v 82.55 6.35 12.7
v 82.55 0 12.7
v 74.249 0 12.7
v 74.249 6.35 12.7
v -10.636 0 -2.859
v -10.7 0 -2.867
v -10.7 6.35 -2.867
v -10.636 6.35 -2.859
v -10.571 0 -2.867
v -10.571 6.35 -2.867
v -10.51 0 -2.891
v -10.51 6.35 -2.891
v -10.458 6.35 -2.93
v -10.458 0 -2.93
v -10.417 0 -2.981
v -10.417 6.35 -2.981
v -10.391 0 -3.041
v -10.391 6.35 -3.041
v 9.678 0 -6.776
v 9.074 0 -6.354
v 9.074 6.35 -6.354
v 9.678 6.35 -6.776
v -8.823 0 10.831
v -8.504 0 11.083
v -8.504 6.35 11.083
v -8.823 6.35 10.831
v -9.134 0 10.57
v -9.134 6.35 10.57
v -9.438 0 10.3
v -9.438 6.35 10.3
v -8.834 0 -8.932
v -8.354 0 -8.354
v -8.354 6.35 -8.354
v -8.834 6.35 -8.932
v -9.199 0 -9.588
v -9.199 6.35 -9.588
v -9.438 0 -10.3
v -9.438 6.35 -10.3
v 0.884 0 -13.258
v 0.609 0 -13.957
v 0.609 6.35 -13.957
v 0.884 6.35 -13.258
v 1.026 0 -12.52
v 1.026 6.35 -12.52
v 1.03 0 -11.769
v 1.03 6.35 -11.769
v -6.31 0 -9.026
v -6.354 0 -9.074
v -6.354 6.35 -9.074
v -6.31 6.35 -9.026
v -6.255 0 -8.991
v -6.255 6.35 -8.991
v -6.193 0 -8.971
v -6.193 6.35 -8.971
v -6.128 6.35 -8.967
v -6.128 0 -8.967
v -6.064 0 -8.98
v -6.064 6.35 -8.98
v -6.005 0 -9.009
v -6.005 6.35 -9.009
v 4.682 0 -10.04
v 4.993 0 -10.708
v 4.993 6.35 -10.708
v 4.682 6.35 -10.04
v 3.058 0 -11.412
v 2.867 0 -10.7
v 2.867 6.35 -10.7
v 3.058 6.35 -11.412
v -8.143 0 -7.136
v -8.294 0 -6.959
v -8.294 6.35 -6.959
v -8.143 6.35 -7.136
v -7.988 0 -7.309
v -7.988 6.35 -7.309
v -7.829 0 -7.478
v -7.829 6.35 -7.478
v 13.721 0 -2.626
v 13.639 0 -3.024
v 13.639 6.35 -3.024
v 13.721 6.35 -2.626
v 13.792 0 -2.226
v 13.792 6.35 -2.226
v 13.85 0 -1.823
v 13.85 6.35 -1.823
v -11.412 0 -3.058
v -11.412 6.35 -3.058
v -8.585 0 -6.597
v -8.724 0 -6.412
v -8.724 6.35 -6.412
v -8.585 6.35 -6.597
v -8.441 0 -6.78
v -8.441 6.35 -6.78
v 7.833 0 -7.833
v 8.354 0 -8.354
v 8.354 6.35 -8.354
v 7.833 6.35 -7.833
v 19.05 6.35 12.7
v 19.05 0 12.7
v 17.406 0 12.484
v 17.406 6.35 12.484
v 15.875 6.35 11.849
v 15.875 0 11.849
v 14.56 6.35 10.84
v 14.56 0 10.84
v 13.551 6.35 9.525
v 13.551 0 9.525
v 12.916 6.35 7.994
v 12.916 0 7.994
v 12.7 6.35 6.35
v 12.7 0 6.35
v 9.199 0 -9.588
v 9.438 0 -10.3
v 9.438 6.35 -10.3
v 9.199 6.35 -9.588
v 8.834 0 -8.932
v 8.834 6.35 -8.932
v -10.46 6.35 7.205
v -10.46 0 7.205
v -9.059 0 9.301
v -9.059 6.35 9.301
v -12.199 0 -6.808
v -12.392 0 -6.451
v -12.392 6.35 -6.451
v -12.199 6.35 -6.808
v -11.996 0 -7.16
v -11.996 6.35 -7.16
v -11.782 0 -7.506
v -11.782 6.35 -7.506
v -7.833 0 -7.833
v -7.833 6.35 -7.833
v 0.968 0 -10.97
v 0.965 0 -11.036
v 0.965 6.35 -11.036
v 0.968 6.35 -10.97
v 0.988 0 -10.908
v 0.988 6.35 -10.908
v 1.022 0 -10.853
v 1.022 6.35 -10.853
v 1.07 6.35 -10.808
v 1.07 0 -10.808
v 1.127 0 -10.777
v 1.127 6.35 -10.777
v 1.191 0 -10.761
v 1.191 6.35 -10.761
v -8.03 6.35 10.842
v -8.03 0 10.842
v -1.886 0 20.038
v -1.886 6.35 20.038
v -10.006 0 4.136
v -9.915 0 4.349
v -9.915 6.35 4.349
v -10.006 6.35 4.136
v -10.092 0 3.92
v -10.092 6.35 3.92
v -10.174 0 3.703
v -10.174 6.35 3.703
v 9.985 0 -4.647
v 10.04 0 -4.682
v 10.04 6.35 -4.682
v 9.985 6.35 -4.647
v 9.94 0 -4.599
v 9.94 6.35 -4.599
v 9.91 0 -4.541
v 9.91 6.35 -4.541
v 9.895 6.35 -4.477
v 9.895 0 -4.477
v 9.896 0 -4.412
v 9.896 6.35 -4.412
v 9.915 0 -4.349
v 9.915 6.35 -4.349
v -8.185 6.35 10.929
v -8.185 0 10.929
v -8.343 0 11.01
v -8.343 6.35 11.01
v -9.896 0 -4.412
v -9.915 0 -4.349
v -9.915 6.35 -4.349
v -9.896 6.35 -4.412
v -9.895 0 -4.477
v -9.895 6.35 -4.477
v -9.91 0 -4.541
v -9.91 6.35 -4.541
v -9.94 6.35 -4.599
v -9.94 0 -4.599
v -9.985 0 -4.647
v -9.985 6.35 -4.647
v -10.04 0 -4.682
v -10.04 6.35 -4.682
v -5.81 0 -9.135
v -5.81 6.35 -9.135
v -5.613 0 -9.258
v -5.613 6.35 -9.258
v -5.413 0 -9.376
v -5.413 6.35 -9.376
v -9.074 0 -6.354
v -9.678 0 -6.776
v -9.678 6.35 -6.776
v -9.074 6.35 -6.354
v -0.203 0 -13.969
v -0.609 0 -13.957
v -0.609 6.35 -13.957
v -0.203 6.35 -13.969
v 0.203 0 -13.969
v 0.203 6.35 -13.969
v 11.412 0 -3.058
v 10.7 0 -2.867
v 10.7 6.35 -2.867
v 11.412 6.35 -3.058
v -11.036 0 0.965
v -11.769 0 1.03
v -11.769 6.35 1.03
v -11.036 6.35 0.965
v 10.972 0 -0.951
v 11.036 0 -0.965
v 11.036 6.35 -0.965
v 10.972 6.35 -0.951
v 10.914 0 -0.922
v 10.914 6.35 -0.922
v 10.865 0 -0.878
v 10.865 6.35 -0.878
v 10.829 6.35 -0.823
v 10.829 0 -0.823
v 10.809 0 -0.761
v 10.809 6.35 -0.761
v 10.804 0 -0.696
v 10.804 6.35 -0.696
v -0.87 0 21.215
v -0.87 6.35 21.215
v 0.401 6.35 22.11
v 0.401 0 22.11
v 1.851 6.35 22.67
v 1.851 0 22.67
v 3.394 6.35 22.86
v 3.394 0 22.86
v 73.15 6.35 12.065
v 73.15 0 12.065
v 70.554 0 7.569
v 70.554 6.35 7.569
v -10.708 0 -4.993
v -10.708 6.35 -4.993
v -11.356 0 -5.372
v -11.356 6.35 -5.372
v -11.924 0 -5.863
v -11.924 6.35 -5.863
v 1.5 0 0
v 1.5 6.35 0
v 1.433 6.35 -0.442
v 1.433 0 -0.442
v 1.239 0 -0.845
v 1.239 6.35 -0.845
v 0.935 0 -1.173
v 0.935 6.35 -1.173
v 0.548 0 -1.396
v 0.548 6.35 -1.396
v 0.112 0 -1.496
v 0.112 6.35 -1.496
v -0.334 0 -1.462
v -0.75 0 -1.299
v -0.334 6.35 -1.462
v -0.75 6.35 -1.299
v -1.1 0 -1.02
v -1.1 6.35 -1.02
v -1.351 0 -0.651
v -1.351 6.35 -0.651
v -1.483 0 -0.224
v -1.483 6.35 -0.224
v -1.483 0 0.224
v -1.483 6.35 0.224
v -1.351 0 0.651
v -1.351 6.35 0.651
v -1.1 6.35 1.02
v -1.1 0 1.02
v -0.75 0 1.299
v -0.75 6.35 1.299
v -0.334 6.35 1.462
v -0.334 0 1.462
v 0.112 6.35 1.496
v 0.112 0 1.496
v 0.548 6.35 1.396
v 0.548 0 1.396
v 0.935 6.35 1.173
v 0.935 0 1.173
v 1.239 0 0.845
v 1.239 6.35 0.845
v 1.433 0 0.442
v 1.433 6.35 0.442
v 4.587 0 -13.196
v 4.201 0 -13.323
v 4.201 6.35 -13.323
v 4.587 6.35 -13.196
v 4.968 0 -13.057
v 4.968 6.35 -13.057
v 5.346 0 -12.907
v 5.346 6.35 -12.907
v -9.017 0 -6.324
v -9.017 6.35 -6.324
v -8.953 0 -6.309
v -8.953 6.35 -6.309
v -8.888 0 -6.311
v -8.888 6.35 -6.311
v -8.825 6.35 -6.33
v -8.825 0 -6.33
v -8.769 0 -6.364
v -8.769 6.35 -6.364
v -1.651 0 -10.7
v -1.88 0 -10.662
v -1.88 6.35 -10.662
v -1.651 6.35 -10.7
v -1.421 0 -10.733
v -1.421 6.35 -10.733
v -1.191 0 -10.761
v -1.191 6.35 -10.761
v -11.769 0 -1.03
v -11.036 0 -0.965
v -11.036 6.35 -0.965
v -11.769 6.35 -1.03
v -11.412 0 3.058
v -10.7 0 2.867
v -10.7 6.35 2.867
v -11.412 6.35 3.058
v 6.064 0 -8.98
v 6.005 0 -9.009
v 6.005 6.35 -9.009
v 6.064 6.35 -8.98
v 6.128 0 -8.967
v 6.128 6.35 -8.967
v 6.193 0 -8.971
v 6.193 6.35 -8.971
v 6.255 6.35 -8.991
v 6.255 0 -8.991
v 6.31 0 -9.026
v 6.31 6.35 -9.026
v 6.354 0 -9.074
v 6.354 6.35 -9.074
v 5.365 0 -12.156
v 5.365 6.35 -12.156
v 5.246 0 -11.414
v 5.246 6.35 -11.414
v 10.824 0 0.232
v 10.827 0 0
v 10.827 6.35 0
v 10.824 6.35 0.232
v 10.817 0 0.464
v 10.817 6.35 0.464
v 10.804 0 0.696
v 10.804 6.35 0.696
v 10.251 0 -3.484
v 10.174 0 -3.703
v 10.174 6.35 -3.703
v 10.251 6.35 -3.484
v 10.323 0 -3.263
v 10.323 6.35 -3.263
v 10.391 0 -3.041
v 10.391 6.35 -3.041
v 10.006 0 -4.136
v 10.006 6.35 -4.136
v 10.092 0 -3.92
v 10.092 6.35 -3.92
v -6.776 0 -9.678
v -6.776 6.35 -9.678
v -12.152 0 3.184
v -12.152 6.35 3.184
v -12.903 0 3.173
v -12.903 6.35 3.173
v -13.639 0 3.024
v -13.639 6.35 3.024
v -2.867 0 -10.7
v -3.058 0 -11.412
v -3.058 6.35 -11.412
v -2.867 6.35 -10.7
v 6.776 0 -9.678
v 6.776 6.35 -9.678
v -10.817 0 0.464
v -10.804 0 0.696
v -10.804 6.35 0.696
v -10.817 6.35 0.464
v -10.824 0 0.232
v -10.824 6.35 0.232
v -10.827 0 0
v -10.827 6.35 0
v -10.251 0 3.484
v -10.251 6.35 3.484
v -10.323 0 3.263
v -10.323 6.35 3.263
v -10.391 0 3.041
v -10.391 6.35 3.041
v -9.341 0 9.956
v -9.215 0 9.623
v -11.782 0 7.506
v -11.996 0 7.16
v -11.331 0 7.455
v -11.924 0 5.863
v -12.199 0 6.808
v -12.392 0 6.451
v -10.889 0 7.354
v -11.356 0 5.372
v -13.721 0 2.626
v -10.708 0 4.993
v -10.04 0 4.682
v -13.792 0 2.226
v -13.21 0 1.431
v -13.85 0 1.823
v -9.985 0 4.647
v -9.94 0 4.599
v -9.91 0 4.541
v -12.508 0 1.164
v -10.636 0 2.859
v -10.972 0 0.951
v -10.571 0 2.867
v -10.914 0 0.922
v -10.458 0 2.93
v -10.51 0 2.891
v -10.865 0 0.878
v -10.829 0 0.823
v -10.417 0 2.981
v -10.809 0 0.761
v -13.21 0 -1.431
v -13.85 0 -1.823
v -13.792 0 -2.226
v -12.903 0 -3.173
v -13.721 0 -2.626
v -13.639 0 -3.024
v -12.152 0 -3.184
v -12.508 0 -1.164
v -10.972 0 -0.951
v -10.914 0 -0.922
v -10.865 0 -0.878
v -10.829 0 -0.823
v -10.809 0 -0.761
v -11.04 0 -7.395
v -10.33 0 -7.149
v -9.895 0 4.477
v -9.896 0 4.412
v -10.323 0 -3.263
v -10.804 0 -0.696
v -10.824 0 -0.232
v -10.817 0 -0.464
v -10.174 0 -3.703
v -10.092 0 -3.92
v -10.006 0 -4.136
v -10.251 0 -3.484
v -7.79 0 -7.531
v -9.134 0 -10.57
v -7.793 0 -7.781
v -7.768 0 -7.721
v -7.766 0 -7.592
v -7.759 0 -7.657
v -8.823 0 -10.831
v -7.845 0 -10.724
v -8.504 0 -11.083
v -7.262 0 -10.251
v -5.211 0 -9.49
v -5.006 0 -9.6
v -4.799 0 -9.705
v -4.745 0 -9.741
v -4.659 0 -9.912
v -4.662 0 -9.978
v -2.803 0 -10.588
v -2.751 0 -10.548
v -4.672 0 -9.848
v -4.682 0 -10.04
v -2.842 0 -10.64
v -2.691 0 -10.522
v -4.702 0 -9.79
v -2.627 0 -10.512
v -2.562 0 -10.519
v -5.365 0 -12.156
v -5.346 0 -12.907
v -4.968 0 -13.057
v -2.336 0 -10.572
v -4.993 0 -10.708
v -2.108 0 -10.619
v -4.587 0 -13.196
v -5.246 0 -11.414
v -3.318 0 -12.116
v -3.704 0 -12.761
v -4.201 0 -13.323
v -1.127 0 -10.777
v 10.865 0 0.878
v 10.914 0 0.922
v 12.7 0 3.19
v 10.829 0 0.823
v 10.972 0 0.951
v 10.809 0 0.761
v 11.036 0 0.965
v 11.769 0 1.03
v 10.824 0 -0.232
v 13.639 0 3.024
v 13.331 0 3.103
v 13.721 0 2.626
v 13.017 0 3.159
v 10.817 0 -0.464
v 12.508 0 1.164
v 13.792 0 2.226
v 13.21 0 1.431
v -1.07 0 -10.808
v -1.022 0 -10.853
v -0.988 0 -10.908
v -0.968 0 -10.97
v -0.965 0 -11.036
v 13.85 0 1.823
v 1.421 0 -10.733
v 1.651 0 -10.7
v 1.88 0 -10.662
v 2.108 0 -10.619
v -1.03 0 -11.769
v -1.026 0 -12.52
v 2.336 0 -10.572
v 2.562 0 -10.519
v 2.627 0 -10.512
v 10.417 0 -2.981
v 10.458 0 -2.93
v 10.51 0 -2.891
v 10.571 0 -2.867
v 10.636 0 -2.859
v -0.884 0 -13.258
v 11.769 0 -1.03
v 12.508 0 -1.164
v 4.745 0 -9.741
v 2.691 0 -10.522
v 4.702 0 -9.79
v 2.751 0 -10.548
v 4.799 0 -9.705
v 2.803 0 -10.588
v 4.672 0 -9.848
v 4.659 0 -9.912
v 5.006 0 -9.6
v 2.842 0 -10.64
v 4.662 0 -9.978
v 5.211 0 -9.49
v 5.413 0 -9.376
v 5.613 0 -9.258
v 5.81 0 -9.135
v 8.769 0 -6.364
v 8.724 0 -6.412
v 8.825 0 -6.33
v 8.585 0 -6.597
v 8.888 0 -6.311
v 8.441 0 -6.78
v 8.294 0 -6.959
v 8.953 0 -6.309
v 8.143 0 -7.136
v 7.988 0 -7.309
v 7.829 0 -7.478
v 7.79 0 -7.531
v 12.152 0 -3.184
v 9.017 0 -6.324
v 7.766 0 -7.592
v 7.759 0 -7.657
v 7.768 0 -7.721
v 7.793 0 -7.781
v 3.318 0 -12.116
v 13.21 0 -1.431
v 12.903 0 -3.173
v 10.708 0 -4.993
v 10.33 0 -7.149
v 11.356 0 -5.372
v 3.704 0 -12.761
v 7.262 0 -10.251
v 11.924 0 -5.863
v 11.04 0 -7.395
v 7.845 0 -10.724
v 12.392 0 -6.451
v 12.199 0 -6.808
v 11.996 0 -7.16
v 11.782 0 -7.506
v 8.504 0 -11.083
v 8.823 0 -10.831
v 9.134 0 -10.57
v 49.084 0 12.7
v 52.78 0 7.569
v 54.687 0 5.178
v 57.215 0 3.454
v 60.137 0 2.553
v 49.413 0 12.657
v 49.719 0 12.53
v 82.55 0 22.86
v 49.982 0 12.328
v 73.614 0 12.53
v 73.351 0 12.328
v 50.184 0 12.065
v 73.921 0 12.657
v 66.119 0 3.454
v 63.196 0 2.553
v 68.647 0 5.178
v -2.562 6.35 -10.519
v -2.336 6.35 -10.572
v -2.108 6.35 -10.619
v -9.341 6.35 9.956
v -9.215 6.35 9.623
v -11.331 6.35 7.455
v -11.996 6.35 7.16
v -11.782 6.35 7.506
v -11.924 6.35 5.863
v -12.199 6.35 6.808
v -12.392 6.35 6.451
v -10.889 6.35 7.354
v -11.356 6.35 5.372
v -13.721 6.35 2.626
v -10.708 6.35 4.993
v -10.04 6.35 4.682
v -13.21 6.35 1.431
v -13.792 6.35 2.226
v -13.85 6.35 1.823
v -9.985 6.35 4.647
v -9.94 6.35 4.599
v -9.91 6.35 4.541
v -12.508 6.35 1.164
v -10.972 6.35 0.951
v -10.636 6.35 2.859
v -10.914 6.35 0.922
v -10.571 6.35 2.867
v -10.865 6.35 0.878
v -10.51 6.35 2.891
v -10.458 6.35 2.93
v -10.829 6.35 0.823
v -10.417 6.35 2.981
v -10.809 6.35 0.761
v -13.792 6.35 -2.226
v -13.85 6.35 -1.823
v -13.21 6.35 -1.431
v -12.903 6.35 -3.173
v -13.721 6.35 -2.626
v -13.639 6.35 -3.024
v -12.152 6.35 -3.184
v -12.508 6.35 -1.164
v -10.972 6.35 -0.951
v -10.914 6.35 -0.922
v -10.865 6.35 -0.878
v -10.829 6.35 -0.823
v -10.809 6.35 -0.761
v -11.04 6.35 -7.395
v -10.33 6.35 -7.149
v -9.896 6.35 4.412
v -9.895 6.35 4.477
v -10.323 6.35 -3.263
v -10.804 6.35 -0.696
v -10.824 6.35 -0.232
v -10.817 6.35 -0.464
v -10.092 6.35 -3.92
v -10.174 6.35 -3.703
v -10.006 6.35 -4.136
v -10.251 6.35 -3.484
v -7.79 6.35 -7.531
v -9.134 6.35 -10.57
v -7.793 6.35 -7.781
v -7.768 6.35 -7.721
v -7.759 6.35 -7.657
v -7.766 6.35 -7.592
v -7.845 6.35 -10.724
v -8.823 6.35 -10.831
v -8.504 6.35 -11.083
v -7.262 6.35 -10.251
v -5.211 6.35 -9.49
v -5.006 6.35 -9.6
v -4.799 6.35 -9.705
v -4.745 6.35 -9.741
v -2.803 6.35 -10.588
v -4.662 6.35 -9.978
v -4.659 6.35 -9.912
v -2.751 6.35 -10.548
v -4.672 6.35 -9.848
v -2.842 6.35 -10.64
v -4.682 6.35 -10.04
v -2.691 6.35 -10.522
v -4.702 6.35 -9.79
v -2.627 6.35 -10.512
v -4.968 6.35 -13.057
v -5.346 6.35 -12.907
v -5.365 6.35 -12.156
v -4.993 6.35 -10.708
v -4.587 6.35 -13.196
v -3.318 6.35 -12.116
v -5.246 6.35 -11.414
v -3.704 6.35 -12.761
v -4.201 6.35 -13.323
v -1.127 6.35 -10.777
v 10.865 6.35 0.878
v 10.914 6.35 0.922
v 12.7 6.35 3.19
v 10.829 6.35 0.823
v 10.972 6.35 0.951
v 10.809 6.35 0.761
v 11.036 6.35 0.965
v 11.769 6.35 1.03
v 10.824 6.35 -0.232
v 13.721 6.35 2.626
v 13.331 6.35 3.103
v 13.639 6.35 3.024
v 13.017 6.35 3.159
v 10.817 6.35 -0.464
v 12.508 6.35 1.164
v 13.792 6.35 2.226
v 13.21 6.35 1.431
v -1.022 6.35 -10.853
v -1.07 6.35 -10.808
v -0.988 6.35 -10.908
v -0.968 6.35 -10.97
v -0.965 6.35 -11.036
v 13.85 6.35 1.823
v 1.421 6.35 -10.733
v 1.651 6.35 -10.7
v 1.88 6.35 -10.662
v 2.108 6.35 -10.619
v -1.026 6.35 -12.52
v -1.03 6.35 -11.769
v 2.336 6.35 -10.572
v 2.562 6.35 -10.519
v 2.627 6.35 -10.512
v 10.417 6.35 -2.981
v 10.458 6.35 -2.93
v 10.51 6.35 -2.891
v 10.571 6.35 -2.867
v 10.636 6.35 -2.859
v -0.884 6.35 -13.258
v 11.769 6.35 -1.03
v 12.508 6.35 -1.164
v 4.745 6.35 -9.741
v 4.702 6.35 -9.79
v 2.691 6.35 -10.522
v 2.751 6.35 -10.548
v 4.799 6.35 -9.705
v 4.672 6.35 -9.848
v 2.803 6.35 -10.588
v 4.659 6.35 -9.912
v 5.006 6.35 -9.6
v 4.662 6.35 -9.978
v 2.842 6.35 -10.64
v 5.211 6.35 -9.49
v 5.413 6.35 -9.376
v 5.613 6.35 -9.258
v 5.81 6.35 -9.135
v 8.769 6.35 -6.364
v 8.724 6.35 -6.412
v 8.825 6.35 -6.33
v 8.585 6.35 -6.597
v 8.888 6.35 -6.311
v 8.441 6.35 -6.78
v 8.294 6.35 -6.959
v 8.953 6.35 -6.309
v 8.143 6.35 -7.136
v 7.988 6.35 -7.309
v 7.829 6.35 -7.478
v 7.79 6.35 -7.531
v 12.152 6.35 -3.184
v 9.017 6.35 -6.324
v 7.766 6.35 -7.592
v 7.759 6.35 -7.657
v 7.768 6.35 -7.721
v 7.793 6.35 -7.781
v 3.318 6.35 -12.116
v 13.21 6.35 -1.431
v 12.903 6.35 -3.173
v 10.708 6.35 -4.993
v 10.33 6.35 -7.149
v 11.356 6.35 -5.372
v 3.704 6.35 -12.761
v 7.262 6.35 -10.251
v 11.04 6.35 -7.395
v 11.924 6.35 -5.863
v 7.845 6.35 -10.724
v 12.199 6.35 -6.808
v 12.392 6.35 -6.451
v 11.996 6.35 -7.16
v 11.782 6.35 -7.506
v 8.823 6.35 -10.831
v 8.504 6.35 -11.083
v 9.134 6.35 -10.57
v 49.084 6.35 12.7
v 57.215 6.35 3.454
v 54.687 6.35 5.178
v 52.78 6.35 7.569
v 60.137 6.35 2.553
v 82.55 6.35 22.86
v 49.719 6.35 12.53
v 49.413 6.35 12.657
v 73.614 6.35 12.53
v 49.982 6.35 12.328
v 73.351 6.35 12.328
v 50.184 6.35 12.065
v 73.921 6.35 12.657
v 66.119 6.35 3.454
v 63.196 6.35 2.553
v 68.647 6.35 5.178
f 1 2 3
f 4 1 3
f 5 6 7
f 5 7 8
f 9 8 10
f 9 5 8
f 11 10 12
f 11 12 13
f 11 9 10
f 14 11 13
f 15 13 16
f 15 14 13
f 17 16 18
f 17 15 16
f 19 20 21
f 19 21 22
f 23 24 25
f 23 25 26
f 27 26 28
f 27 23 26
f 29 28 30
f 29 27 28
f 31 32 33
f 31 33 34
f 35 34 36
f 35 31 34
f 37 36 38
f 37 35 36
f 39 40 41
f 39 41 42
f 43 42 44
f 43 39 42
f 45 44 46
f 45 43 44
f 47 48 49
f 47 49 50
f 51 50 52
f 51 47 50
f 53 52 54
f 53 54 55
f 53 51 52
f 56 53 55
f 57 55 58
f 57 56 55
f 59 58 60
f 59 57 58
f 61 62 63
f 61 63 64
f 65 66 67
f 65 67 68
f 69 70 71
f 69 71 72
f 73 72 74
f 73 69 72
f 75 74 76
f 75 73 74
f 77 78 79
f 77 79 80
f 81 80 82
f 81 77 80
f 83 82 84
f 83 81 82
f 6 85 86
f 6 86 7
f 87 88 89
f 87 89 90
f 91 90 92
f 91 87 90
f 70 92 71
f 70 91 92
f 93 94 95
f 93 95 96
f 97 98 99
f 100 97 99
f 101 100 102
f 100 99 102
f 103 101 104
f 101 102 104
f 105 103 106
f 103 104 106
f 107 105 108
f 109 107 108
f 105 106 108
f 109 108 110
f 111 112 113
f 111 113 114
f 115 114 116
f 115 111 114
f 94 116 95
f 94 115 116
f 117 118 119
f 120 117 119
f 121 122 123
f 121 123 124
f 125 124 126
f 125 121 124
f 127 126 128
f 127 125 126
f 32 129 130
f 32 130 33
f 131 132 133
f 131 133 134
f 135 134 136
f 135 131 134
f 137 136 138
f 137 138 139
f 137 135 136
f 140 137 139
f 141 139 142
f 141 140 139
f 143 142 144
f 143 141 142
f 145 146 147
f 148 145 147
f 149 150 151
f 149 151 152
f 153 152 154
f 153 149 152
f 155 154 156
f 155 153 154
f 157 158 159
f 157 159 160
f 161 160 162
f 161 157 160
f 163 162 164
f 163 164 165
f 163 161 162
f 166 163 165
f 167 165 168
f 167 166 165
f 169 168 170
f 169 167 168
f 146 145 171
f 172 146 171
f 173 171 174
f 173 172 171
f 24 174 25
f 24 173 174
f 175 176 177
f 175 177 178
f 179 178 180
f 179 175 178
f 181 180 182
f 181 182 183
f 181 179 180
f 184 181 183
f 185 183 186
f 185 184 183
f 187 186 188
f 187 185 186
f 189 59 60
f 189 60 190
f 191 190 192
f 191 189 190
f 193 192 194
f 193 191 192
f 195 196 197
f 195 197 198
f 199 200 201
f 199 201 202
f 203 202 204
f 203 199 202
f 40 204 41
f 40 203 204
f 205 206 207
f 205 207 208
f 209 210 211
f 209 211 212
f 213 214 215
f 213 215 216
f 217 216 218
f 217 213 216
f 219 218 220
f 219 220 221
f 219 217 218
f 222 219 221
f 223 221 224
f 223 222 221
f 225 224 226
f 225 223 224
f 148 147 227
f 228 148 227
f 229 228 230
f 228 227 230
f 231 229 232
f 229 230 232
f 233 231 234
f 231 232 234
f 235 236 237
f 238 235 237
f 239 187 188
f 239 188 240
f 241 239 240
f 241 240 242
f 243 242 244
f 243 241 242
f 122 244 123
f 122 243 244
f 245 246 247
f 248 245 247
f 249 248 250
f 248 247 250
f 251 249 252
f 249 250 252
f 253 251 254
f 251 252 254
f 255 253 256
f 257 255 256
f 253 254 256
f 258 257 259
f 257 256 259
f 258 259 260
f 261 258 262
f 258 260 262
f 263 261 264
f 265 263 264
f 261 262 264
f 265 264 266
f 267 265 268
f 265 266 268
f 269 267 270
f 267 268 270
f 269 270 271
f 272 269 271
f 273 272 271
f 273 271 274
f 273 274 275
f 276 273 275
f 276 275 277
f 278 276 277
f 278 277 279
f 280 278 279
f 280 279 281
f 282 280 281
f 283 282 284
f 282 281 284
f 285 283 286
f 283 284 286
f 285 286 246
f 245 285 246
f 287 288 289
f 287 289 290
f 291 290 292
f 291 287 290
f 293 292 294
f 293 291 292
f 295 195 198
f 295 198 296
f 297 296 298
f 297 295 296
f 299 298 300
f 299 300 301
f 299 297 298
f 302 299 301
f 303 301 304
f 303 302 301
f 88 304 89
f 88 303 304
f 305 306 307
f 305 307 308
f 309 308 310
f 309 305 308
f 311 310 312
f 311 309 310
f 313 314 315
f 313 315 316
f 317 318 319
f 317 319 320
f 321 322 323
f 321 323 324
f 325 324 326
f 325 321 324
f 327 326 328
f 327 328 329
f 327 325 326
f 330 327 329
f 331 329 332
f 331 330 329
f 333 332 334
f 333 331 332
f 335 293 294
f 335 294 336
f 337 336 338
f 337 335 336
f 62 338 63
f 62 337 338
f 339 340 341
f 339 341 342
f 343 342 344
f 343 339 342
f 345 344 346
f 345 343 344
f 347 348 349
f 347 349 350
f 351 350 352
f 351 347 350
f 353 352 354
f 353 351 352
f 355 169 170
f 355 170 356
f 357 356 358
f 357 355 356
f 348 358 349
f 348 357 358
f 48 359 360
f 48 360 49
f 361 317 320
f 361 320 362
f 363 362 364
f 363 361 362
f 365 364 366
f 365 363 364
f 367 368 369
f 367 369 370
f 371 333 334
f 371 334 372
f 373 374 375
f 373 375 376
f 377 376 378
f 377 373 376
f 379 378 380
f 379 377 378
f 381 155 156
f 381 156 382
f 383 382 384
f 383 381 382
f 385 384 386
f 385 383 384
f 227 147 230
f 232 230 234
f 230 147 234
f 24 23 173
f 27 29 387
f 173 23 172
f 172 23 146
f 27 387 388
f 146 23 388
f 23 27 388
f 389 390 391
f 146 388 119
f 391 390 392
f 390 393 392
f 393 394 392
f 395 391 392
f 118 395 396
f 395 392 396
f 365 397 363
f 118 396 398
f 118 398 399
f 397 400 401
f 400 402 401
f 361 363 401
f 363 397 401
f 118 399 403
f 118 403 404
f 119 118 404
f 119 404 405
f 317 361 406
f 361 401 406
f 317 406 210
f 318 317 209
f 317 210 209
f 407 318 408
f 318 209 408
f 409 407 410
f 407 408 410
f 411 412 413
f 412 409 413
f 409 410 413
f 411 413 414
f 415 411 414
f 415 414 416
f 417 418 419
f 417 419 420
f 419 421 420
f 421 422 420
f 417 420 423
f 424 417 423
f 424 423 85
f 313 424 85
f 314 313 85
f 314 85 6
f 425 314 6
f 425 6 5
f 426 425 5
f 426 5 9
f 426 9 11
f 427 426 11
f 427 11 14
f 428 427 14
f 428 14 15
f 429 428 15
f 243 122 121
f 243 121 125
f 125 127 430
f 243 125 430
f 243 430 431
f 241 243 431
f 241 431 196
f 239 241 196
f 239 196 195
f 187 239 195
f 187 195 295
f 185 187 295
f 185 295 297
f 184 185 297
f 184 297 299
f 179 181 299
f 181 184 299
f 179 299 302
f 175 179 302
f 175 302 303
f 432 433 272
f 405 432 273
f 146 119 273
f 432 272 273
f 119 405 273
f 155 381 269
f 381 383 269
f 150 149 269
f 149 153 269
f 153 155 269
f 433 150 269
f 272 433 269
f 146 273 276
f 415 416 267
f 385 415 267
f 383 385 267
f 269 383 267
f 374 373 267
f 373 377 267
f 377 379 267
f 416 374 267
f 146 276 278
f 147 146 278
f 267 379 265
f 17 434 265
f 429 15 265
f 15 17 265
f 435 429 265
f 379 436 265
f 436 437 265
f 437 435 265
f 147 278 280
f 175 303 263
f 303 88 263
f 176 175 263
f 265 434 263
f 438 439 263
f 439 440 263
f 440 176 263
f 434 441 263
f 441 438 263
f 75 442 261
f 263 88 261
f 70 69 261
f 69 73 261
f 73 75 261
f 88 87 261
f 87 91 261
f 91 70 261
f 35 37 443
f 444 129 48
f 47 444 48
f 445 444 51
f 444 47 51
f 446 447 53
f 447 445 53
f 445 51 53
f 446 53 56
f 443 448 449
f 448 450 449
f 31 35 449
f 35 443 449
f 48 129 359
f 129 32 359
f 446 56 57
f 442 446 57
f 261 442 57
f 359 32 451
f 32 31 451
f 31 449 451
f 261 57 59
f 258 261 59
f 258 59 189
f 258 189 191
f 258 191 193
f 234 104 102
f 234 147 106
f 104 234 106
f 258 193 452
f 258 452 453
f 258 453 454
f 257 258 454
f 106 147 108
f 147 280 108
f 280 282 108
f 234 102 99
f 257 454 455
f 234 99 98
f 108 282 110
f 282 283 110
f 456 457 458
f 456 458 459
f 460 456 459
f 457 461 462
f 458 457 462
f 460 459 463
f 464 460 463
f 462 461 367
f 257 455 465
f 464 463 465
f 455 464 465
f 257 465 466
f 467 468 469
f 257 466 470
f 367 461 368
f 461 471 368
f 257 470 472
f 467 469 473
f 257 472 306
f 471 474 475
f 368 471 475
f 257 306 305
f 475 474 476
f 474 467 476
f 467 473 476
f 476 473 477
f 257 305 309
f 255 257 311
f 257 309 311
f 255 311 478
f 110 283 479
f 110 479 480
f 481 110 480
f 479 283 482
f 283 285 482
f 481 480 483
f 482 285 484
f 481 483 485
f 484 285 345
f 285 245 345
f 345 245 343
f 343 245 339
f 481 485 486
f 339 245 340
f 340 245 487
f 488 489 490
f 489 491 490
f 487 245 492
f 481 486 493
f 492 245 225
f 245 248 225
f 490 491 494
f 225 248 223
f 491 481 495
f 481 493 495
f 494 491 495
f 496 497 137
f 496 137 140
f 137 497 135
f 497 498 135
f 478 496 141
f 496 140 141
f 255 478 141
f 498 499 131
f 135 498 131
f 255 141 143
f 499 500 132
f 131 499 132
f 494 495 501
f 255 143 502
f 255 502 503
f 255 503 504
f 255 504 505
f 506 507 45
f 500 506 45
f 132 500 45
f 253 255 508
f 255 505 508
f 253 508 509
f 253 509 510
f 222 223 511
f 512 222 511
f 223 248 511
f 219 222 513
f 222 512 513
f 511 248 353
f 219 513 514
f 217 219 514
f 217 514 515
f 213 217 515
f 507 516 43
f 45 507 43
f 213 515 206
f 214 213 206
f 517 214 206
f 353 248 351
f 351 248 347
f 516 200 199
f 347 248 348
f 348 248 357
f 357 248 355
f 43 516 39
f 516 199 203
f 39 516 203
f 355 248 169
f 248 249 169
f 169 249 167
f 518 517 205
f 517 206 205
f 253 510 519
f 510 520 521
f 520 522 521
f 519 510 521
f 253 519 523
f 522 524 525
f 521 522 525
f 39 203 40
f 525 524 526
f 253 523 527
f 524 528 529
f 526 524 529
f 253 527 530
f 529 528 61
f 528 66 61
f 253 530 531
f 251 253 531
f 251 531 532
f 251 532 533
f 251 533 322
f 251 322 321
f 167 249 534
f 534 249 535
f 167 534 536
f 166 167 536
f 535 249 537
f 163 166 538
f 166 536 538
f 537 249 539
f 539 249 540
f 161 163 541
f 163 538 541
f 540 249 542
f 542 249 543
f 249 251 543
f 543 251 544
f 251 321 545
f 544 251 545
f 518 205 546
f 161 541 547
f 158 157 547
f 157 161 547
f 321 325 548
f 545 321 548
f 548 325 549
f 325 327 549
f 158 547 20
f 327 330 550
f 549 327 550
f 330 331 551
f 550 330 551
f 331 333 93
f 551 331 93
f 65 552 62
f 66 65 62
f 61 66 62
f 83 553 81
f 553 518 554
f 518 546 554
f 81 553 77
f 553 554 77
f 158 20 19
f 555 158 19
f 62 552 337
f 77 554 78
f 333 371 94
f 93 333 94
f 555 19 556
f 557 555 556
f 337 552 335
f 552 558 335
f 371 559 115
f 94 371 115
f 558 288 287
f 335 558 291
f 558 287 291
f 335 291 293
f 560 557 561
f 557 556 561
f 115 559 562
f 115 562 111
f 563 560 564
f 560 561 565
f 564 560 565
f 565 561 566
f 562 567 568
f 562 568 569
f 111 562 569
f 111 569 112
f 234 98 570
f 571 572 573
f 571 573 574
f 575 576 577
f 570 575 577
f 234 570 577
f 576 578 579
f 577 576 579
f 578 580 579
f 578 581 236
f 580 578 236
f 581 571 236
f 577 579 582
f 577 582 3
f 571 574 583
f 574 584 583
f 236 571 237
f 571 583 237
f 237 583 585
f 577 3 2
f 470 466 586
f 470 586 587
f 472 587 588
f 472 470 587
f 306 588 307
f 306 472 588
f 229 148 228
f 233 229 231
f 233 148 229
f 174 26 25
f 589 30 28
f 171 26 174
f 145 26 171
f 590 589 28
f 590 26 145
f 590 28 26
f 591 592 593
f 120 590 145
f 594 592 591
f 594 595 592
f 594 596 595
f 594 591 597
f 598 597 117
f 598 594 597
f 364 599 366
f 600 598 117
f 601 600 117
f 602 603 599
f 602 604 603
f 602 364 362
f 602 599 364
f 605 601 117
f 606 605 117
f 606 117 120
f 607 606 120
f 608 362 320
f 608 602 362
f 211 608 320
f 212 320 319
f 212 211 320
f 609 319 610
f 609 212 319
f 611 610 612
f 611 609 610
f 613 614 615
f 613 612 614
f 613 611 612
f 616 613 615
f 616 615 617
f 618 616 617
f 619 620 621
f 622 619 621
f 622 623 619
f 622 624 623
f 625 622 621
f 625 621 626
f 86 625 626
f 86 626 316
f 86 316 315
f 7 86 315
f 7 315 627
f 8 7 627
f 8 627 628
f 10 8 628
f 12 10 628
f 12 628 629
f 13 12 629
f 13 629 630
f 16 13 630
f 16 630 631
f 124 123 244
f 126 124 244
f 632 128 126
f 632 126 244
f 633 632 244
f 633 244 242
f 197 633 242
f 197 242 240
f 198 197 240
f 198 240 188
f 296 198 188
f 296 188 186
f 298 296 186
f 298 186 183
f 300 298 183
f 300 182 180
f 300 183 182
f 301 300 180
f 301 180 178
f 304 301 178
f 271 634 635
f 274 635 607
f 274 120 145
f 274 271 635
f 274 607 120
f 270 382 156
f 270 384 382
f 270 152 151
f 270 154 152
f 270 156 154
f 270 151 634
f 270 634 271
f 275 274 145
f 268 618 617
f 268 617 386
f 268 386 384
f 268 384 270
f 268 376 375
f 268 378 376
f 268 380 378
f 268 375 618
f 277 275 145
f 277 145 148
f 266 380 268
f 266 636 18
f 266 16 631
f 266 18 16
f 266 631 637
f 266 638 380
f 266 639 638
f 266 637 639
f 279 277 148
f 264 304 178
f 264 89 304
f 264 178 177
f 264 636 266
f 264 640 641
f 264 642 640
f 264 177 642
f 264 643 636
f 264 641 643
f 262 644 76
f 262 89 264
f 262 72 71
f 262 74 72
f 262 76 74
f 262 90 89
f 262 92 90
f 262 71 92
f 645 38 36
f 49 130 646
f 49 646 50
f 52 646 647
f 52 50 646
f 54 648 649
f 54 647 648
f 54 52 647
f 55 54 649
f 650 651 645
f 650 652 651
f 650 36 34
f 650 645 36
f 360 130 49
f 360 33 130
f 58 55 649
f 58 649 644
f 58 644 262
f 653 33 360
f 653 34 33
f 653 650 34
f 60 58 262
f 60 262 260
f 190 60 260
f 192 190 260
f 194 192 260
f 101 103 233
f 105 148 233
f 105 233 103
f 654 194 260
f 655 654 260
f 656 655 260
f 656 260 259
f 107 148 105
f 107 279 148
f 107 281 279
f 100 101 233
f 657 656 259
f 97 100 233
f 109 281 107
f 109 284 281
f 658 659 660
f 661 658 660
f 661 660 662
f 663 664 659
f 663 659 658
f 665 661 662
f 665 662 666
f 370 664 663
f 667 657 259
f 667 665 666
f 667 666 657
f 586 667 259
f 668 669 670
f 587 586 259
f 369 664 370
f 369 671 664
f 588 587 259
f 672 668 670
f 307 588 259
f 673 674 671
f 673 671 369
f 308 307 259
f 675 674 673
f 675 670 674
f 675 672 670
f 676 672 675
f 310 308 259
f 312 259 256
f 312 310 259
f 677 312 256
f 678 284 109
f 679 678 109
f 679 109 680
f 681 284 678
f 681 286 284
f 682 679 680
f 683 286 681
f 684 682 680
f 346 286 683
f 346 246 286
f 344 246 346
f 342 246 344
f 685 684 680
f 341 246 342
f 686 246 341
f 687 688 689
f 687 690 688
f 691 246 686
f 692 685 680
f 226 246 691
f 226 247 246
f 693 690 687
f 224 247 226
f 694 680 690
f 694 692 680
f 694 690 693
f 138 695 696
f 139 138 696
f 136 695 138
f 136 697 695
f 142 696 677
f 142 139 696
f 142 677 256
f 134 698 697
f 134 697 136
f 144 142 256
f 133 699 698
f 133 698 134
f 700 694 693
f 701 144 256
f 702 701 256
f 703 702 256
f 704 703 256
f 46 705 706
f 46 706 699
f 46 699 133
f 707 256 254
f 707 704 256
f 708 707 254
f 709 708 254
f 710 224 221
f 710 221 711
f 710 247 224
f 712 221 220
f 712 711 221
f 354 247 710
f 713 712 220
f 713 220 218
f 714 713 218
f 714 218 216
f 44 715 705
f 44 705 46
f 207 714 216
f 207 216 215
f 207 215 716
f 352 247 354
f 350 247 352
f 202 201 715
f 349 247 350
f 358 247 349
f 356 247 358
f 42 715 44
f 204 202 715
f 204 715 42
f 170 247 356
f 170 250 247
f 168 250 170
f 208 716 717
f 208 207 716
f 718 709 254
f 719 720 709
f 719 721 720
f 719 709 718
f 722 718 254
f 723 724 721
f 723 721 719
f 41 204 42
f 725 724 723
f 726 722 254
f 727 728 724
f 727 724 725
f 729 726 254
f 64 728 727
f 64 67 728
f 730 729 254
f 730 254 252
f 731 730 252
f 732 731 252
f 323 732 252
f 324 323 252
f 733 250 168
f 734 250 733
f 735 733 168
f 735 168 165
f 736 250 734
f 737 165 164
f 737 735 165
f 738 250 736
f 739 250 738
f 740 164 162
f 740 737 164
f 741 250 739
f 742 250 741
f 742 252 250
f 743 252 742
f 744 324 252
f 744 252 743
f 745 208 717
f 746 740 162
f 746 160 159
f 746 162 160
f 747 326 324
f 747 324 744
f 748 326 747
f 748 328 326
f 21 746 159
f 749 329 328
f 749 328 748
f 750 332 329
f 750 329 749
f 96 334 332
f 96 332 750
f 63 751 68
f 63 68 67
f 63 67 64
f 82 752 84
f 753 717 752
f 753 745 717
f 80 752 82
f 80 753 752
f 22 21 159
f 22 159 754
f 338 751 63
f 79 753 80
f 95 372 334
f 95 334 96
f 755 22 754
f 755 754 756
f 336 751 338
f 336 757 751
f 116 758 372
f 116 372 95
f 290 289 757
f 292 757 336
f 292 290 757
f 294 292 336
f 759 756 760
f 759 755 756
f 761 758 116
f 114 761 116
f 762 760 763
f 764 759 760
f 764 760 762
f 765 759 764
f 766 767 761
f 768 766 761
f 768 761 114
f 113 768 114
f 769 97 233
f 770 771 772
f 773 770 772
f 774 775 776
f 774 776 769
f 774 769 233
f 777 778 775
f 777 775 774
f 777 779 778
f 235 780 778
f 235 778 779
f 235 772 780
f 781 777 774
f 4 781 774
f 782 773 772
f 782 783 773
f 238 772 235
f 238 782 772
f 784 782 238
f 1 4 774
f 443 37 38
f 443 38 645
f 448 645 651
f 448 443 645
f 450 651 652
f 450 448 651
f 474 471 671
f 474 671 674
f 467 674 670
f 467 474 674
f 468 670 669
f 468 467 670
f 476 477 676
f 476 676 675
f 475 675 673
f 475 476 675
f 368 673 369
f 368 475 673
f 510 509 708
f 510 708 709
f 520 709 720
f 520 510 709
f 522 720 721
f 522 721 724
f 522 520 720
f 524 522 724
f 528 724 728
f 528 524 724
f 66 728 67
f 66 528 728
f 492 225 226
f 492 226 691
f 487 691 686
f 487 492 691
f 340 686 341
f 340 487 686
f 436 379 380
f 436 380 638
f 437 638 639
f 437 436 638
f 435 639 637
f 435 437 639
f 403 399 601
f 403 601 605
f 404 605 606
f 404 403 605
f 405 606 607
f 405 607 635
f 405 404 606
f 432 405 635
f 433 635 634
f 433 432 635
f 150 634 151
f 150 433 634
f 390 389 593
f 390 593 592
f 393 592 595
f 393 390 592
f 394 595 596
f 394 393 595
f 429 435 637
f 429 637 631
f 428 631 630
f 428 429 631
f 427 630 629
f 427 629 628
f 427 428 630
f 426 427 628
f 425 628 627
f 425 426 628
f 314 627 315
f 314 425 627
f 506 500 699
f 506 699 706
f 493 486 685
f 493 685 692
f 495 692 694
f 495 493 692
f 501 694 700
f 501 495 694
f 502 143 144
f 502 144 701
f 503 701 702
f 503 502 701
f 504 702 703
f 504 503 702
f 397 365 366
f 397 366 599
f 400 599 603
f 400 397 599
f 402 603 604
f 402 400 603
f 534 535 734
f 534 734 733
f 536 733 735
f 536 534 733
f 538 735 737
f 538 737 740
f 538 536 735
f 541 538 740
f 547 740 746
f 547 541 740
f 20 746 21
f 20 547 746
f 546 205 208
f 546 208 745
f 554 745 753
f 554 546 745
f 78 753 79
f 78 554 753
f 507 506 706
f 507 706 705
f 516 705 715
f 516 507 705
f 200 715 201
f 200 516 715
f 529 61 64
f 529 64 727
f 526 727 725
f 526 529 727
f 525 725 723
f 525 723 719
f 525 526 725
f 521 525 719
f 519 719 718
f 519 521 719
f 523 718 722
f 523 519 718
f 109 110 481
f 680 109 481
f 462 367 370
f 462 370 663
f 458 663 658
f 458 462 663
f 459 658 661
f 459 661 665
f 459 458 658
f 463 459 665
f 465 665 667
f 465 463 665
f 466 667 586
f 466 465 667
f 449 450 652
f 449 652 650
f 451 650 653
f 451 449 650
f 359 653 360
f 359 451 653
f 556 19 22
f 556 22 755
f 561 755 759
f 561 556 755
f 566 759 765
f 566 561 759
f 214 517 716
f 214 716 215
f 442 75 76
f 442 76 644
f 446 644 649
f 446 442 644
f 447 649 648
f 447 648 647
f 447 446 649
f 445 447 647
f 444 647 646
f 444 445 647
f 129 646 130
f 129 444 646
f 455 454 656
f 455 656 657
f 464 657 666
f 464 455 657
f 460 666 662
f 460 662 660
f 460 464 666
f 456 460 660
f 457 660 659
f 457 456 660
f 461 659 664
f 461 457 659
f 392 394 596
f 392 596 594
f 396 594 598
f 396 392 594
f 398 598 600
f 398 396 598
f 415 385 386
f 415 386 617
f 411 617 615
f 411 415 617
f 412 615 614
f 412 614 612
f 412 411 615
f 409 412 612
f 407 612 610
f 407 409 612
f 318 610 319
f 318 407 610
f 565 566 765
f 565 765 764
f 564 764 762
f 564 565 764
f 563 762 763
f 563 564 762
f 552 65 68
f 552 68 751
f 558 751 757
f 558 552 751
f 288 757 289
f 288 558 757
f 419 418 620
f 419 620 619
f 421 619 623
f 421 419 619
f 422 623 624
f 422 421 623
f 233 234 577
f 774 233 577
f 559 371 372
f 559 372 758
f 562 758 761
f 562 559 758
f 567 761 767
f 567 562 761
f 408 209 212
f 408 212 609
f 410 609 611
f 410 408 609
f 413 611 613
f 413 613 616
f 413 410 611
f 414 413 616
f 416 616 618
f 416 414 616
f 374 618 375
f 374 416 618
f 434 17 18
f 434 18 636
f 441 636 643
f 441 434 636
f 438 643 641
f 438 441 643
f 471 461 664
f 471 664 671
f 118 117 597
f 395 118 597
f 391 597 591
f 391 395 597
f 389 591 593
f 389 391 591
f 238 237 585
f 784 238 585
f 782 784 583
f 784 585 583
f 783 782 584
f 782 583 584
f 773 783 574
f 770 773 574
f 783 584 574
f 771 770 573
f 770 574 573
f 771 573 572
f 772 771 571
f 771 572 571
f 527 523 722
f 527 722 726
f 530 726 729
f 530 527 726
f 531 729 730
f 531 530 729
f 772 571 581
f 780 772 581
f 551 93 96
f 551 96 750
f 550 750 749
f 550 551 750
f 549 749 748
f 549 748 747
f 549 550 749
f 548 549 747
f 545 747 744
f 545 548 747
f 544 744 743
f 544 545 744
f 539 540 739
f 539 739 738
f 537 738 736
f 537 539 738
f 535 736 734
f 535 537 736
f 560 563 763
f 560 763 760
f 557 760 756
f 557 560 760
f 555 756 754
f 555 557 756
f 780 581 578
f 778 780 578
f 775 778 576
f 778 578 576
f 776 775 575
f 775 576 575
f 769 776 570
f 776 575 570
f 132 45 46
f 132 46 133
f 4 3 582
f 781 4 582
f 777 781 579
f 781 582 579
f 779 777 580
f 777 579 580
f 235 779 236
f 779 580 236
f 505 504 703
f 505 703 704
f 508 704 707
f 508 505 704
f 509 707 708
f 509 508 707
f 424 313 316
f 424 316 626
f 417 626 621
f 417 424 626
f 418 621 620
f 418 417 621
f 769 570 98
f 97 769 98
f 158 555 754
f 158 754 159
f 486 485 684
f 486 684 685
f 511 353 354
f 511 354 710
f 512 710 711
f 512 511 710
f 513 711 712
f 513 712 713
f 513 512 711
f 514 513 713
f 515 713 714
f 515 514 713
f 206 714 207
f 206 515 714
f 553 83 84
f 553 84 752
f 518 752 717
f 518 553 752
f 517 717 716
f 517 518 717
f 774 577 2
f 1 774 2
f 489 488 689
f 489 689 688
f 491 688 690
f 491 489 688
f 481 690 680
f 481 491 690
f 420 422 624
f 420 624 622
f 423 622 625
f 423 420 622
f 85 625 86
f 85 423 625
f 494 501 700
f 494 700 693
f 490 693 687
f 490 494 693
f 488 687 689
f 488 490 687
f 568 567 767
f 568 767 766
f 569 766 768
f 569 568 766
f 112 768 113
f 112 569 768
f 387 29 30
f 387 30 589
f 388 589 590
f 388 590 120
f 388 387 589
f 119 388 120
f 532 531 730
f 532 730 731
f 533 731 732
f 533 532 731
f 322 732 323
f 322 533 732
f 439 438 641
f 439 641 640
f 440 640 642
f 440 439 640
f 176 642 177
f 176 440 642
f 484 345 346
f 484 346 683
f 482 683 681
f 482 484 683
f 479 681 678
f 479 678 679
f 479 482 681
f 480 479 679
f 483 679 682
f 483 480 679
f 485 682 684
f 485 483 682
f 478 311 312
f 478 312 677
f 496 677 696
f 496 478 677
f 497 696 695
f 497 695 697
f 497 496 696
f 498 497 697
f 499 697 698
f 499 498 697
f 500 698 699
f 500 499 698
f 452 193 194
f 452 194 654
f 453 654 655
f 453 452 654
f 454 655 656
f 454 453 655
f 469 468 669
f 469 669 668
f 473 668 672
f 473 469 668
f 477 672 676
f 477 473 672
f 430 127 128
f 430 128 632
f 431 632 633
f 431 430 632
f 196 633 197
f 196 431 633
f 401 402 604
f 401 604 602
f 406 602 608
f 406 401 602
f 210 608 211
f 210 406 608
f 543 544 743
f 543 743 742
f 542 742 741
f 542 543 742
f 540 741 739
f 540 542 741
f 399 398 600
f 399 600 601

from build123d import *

# Parameters (mm, degrees)
BOSS_EXTRUDE1_DEPTH = 6.35
CIRPATTERN1_COUNT   = 18
BOSS_EXTRUDE3_START = -6.35
BOSS_EXTRUDE3_DEPTH = 6.35
SKETCH4_R           = 1.500000048
CUT_EXTRUDE1_DEPTH  = 6.35


with BuildPart() as part:
    # Sketch1 → Boss-Extrude1 (new body)
    with BuildSketch(Plane(origin=(0, 0, 0), x_dir=(1, 0, 0), z_dir=(0, 1, 0))):
        with BuildLine():
            Line((0, 0), (-1.880045408, 10.66226734))
            ThreePointArc((-1.880045408, 10.66226734), (-1.536116928, 10.717222604), (-1.190598755, 10.761086849))
            ThreePointArc((-1.190598755, 10.761086849), (-1.022096794, 10.852519273), (-0.965497238, 11.035683923))
            Line((-0.965497238, 11.035683923), (-1.029695335, 11.769471531))
            ThreePointArc((-1.029695335, 11.769471531), (-0.972041848, 12.892396814), (-0.609362841, 13.956703655))
            ThreePointArc((-0.609362841, 13.956703655), (0, 13.97), (0.609362841, 13.956703655))
            ThreePointArc((0.609362841, 13.956703655), (0.972041848, 12.892396814), (1.029695335, 11.769471531))
            Line((1.029695335, 11.769471531), (0.965497238, 11.035683923))
            ThreePointArc((0.965497238, 11.035683923), (1.022096794, 10.852519273), (1.190598755, 10.761086849))
            ThreePointArc((1.190598755, 10.761086849), (1.536116928, 10.717222604), (1.880045408, 10.66226734))
            Line((1.880045408, 10.66226734), (0, 0))
        make_face()
    boss_extrude1 = extrude(amount=BOSS_EXTRUDE1_DEPTH)

    # CirPattern1: Boss-Extrude1 ×18 about axis
    cirpattern1_axis = Axis((0, 0, 0), (0, 1, 0))
    for i in range(1, CIRPATTERN1_COUNT):
        add(boss_extrude1.rotate(cirpattern1_axis, i * 360 / CIRPATTERN1_COUNT))

    # Sketch2 → Boss-Extrude3 (add)
    with BuildSketch(Plane(origin=(0, 6.35, 0), x_dir=(1, 0, 0), z_dir=(0, 1, 0)).offset(BOSS_EXTRUDE3_START)):
        with BuildLine():
            Line((49.084416739, -12.7), (19.05, -12.7))
            ThreePointArc((19.05, -12.7), (14.559871939, -10.840128061), (12.7, -6.35))
            Line((12.7, -6.35), (12.7, -3.175))
            Line((12.7, -3.175), (0, 0))
            Line((0, 0), (-10.559788625, -7.055555556))
            Line((-10.559788625, -7.055555556), (-1.88567654, -20.037777778))
            ThreePointArc((-1.88567654, -20.037777778), (0.400799065, -22.110173608), (3.394217772, -22.86))
            Line((3.394217772, -22.86), (82.55, -22.86))
            Line((82.55, -22.86), (82.55, -12.7))
            Line((82.55, -12.7), (74.249409051, -12.7))
            ThreePointArc((74.249409051, -12.7), (73.614409051, -12.529852263), (73.149556788, -12.065))
            Line((73.149556788, -12.065), (70.553858881, -7.569119343))
            ThreePointArc((70.553858881, -7.569119343), (61.666912895, -2.438238686), (52.77996691, -7.569119343))
            Line((52.77996691, -7.569119343), (50.184269002, -12.065))
            ThreePointArc((50.184269002, -12.065), (49.719416739, -12.529852263), (49.084416739, -12.7))
        make_face()
    extrude(amount=BOSS_EXTRUDE3_DEPTH)

    # Sketch4 → Cut-Extrude1 (cut)
    with BuildSketch(Plane(origin=(0, 6.35, 0), x_dir=(1, 0, 0), z_dir=(0, 1, 0))):
        Circle(SKETCH4_R)
    extrude(amount=-CUT_EXTRUDE1_DEPTH, mode=Mode.SUBTRACT)


solid = part.part
